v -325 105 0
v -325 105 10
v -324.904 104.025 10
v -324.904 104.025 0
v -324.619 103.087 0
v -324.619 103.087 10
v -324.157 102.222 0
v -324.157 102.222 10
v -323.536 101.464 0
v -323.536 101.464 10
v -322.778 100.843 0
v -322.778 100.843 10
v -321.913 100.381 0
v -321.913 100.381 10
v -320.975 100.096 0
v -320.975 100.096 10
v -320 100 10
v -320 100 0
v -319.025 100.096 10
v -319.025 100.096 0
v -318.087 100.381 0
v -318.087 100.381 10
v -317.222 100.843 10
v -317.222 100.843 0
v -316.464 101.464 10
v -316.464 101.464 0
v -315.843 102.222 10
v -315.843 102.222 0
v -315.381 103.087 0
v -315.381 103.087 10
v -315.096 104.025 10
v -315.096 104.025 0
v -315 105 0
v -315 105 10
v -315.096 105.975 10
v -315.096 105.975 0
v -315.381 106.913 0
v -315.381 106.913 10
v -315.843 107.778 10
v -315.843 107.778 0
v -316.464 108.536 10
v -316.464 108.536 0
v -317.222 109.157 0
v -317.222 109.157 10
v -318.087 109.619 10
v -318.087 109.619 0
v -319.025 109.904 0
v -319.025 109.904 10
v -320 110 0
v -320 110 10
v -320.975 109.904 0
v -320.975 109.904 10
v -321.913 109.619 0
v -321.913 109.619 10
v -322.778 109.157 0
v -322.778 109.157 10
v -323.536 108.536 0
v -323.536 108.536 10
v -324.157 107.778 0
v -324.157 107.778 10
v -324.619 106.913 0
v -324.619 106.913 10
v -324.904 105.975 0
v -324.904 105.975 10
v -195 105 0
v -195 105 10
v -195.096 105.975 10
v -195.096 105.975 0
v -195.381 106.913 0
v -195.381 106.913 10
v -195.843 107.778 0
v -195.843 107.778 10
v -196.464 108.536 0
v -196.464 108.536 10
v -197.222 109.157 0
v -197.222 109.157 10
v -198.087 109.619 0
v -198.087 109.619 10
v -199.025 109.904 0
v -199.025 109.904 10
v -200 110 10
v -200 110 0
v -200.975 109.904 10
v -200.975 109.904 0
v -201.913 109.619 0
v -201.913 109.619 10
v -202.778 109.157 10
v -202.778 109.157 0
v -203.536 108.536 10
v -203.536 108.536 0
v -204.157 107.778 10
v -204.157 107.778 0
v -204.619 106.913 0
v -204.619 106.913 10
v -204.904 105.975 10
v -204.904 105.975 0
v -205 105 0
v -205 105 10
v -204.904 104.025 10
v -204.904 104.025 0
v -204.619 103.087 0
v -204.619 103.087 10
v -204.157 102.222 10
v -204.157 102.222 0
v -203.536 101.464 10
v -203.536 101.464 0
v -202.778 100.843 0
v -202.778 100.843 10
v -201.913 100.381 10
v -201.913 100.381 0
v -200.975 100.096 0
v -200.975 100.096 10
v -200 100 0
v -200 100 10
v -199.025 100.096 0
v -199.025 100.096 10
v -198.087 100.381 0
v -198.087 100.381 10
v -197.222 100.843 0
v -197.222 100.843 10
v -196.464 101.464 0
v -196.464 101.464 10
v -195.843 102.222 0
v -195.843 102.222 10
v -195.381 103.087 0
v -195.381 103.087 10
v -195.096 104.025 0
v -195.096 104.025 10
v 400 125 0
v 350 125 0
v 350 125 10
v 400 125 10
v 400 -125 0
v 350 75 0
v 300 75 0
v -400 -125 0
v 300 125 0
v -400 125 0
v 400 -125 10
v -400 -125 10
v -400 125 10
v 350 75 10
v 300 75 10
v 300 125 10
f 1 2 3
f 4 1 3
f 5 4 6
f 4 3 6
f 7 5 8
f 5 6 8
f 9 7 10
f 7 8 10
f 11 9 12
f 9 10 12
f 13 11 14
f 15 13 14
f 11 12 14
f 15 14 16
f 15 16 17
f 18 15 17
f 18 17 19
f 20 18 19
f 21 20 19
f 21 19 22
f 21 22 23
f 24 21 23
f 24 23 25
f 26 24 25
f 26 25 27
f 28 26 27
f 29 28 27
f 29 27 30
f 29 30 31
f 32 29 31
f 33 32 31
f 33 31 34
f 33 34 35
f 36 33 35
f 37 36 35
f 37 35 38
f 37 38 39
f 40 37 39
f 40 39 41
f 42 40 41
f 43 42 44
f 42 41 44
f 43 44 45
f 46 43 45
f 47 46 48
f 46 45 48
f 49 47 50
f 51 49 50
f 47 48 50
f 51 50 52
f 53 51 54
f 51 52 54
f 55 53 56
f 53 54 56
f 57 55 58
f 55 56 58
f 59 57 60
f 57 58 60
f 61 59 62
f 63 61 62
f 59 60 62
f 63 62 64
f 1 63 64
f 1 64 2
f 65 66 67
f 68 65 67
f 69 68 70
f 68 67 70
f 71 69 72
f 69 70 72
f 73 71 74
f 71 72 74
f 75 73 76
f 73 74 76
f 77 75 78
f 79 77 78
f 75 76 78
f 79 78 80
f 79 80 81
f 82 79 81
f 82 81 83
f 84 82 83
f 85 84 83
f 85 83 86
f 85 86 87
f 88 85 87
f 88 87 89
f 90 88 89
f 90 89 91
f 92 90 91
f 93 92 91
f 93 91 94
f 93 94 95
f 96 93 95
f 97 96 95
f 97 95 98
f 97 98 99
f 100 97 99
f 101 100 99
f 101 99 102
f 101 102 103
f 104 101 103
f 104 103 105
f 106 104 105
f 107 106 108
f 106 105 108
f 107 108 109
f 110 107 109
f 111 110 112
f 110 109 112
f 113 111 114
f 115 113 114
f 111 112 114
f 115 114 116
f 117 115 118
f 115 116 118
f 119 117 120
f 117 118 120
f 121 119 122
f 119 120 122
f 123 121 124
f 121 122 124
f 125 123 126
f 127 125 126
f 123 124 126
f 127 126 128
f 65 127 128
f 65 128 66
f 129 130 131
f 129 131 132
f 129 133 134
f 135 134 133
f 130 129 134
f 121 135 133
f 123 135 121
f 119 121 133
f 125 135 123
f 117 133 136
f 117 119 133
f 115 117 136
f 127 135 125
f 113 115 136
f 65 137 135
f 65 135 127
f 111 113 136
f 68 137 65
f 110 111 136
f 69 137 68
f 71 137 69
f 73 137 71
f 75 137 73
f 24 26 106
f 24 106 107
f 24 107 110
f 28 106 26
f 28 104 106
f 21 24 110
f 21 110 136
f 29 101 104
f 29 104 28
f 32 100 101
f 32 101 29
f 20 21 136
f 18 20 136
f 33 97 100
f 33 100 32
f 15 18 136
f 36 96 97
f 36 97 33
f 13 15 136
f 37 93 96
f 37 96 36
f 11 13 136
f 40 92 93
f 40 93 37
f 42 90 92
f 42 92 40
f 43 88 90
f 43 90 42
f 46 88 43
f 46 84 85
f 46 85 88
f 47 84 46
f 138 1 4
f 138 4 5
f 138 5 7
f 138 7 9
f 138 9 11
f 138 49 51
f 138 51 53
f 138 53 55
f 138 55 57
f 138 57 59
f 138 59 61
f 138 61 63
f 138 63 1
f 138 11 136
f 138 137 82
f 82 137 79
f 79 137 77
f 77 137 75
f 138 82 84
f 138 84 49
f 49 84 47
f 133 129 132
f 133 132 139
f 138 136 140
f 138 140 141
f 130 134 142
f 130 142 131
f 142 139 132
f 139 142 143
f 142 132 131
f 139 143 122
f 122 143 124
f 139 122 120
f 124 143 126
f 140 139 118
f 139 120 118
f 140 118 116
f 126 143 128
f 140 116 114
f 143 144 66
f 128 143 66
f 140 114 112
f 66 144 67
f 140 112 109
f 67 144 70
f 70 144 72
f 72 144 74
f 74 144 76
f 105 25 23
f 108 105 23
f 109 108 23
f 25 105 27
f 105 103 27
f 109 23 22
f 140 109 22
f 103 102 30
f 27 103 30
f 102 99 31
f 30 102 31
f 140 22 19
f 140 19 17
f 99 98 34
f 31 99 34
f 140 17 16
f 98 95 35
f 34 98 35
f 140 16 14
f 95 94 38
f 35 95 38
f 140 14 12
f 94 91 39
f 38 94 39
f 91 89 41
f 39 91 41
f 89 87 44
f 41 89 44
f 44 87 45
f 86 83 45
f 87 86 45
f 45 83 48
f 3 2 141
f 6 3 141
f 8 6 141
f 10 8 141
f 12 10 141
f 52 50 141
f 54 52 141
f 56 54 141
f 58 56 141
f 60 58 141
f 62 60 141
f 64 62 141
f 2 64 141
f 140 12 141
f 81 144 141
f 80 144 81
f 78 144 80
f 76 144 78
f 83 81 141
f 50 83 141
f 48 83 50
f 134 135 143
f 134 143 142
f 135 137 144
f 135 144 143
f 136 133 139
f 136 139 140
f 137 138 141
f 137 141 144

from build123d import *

# Parameters (mm, degrees)
BOSS_EXTRUDE1_DEPTH = 10
CUT_EXTRUDE1_REACH  = 421.196
SKETCH3_R           = 5


with BuildPart() as part:
    # Sketch1 → Boss-Extrude1 (new body)
    with BuildSketch(Plane.XY):
        Polygon((300, 125), (300, 75), (350, 75), (350, 125), (400, 125), (400, -125), (-400, -125), (-400, 125), align=None)
    extrude(amount=BOSS_EXTRUDE1_DEPTH)

    # Sketch3 → Cut-Extrude1 (cut, up to next)
    with BuildSketch(Plane.XY.offset(10), mode=Mode.PRIVATE) as cut_extrude1_sk1:
        with Locations((-200, 105)):
            Circle(SKETCH3_R)
    cut_extrude1_tool1 = extrude(cut_extrude1_sk1.sketch, amount=-CUT_EXTRUDE1_REACH, mode=Mode.PRIVATE) & part.part
    # Sketch3 → Cut-Extrude1 (cut, up to next)
    with BuildSketch(Plane.XY.offset(10), mode=Mode.PRIVATE) as cut_extrude1_sk2:
        with Locations(Location((-320, 105, 0), (0, 0, 180))):
            Circle(SKETCH3_R)
    cut_extrude1_tool2 = extrude(cut_extrude1_sk2.sketch, amount=-CUT_EXTRUDE1_REACH, mode=Mode.PRIVATE) & part.part
    add(cut_extrude1_tool1.solids().sort_by_distance((-200, 105, 10))[0], mode=Mode.SUBTRACT)
    add(cut_extrude1_tool2.solids().sort_by_distance((-320, 105, 10))[0], mode=Mode.SUBTRACT)


solid = part.part
